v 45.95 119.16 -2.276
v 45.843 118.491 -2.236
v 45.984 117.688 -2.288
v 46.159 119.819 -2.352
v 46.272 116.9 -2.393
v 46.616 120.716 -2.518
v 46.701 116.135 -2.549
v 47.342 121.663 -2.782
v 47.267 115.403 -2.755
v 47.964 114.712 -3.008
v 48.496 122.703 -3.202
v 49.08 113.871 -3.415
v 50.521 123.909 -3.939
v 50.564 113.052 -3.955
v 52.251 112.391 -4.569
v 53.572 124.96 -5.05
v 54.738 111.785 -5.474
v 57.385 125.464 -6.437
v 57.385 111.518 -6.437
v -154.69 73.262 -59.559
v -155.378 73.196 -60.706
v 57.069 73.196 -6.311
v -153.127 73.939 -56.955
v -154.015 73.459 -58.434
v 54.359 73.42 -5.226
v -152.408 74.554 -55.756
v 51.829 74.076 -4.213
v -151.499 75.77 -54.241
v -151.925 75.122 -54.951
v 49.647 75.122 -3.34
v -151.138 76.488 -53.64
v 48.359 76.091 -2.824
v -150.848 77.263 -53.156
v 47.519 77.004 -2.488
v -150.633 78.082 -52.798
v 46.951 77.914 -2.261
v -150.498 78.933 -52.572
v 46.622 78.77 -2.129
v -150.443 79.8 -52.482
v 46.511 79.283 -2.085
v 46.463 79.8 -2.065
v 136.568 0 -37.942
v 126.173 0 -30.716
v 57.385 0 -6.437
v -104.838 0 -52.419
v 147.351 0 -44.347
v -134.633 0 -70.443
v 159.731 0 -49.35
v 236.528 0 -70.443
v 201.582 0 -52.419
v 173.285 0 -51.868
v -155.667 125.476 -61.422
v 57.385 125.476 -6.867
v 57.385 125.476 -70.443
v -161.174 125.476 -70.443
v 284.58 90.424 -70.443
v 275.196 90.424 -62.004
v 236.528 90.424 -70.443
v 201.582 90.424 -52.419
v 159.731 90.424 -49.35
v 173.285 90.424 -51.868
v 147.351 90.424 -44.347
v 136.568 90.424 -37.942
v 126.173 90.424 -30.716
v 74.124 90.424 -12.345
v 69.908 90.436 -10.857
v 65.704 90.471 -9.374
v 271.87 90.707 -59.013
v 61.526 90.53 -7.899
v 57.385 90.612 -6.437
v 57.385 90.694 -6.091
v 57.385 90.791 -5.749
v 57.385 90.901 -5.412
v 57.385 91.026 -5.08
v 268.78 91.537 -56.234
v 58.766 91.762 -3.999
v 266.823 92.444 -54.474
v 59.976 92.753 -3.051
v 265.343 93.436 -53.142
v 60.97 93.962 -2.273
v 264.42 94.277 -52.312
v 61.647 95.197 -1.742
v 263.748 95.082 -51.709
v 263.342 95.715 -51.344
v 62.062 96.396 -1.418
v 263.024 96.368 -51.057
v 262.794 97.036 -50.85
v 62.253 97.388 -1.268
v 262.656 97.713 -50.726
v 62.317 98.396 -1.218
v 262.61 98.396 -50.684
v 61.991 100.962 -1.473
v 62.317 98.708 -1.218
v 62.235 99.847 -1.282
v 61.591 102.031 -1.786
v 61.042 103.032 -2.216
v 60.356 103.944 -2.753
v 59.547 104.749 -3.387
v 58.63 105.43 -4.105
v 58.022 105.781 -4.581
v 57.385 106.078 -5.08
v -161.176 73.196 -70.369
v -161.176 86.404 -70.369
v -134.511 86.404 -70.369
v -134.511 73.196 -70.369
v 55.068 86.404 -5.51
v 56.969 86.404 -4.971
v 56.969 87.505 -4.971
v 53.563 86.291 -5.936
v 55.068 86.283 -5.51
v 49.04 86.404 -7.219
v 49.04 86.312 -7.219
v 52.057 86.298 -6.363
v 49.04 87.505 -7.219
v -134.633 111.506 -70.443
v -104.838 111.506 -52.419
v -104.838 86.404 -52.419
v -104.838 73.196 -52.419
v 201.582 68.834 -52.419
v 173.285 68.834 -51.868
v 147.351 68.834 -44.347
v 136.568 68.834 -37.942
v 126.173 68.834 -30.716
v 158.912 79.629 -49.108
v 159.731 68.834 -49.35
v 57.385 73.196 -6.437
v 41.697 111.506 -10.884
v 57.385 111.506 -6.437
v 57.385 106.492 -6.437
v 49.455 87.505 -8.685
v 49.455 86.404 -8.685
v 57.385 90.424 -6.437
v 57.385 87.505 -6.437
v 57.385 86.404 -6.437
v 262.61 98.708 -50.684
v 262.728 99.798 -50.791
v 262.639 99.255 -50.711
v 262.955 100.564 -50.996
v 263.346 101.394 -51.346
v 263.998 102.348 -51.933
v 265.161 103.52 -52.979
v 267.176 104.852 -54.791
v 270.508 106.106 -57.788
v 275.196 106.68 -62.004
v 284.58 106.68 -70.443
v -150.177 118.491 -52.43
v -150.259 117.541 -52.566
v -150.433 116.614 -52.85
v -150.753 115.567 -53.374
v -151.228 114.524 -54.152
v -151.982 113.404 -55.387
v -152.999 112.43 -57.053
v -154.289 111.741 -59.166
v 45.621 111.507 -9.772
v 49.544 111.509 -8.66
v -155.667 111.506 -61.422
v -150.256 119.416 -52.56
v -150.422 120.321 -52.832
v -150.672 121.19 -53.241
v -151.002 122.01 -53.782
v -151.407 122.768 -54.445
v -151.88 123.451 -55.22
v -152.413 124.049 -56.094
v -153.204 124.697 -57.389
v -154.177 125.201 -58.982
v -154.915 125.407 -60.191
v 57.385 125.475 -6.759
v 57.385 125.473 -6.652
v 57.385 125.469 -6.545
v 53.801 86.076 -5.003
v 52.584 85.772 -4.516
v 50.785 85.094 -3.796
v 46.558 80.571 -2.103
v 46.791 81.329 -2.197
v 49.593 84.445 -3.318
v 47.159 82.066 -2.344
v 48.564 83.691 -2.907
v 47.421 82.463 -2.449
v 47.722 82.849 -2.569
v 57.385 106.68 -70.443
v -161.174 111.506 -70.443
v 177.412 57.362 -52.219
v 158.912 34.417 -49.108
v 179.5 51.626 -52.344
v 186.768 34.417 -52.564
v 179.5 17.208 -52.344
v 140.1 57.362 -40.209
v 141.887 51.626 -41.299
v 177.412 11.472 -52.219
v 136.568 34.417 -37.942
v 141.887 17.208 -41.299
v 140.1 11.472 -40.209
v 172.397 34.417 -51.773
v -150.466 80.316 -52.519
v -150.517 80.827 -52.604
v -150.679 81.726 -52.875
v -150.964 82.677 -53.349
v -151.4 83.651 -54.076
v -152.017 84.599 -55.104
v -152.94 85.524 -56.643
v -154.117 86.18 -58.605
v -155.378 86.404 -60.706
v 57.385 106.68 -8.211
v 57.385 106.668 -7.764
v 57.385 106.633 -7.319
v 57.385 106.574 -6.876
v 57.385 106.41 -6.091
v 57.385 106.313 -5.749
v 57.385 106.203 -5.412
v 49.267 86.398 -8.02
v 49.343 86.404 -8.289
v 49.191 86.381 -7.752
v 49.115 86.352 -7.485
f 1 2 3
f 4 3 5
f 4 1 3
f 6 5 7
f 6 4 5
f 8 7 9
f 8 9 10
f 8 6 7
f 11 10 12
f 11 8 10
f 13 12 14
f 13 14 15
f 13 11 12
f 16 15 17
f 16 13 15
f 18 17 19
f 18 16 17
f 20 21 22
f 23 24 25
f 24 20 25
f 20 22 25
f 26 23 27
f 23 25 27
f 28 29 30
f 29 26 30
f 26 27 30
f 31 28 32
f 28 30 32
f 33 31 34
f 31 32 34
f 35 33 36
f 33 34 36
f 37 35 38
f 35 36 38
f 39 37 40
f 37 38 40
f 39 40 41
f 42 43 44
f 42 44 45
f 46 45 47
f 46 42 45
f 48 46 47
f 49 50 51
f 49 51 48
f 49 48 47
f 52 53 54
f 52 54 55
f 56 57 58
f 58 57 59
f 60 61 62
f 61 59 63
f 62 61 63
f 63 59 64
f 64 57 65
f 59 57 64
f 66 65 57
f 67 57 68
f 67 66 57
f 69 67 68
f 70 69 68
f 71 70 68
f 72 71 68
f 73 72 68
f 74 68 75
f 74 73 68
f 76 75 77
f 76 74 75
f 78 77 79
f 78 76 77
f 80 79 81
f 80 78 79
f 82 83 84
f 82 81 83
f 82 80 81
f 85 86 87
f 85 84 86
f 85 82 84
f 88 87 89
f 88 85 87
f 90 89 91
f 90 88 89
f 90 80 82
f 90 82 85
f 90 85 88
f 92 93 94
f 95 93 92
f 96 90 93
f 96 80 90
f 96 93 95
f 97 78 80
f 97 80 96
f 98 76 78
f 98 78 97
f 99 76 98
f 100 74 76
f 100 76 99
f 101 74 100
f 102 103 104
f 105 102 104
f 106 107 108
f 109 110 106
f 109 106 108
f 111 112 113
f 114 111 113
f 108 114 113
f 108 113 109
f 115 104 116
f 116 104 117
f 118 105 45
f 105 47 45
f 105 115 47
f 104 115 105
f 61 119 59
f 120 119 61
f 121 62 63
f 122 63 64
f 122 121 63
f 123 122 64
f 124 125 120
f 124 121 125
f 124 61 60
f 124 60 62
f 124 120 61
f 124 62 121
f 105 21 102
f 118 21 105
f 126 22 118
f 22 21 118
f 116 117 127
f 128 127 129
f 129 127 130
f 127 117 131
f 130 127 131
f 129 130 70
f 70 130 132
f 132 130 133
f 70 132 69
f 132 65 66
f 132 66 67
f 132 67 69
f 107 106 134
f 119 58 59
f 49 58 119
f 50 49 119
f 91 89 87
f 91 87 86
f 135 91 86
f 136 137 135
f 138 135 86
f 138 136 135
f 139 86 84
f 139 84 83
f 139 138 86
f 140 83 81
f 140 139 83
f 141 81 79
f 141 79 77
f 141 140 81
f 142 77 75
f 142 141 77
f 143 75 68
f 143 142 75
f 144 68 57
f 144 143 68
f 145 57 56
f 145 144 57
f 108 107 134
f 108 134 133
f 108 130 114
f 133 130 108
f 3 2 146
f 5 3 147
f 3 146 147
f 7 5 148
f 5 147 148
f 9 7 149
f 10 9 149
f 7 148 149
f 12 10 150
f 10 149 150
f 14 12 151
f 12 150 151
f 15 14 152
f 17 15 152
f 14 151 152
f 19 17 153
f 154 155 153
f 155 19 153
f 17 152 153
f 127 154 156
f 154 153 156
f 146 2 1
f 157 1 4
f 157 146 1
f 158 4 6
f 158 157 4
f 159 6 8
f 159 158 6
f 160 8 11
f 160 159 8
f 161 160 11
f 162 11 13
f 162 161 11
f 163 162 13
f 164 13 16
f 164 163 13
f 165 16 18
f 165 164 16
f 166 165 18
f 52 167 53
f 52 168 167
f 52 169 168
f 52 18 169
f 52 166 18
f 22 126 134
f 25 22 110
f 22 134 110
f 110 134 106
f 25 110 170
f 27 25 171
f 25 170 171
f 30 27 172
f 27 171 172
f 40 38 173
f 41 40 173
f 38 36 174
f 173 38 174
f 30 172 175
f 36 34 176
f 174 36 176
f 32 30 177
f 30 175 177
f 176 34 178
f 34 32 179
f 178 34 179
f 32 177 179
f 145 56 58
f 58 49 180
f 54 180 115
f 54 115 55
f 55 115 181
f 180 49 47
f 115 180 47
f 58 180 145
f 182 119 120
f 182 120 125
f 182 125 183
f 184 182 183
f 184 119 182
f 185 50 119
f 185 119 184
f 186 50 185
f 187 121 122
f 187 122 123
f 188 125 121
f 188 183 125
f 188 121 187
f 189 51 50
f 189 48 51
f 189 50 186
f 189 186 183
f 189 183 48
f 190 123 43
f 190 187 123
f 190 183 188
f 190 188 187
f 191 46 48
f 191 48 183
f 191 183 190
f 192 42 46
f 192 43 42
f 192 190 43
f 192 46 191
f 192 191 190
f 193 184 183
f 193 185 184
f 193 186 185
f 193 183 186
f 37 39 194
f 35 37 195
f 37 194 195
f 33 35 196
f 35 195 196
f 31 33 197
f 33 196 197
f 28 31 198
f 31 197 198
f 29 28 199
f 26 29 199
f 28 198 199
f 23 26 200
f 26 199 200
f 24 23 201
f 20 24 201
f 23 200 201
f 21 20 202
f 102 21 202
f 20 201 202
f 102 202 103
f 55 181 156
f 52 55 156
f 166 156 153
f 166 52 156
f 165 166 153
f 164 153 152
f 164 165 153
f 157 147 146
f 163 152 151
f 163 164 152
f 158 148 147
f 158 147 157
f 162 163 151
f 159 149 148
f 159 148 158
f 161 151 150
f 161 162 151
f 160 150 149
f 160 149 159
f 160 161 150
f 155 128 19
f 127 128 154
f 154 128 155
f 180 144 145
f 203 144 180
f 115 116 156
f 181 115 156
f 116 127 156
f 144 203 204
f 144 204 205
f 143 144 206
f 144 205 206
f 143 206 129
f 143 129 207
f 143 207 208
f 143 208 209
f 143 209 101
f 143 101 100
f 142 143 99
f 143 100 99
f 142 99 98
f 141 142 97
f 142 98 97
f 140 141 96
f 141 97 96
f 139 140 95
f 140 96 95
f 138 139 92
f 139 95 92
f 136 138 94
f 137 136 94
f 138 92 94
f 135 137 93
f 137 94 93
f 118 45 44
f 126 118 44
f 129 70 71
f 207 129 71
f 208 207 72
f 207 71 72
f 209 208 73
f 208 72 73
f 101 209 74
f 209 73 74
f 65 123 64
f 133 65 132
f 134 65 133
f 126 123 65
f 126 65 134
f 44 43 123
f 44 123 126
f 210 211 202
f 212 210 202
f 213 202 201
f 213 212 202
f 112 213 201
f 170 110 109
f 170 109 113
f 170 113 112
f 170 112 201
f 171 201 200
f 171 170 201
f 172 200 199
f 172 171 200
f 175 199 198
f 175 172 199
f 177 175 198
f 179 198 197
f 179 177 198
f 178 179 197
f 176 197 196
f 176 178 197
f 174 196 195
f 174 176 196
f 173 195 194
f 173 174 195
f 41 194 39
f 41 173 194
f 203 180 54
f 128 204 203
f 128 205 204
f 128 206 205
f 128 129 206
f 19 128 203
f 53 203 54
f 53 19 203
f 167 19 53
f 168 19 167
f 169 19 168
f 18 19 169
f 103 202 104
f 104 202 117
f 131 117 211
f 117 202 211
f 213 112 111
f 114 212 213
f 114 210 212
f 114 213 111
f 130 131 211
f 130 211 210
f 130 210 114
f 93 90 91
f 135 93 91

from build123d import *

# Parameters (mm, degrees)
F1_DEPTH      = 68.834
F3_DEPTH      = 56.642
F4_DEPTH      = 21.59
F6_DEPTH      = 16.256
F7_T1_DEPTH   = 134.6089194051
F8_SIZE       = 5.08
F9_T4_DEPTH   = 246.1695934192
F9_T9_DEPTH   = 246.1695934192
F11_DEPTH     = 13.97
F12_T1_DEPTH  = 239.1129526059
F12_T6_DEPTH  = 239.1129526059
F13_W         = 8.2417714845
F13_H         = 1.1003240943
F14_DEPTH     = 1.524
F16_DEPTH     = 13.208
F17_T1_DEPTH  = 236.9807138407
F17_T6_DEPTH  = 236.9807138407
F17_T12_DEPTH = 236.9807138407
F17_T18_DEPTH = 236.9807138407


# Not quite as in the source:
# - a fillet or chamfer that OpenCascade refuses, or shapes differently, is made with other operations: its cross-section is extruded or revolved along the edge and cut away or added


with BuildPart() as f1:
    # F0 (on Front) → F1 (new body)
    with BuildSketch(Plane.XZ):
        with BuildLine():
            Line((-134.6334815025, -70.4434812069), (236.5282326937, -70.4434812069))
            Line((236.5282326937, -70.4434812069), (201.5823870897, -52.4187758565))
            add(Edge.make_bspline(
                [(201.5823870897, -52.4187758565), (186.6945113423, -52.7201094998), (157.86128429, -53.3036998994), (136.5029788289, -38.0790520799), (126.1729151011, -30.7155661285)],
                knots=[0, 0, 0, 0, 0.5163444147, 1, 1, 1, 1], degree=3))
            Line((126.1729151011, -30.7155661285), (57.3847740889, -6.4373956993))
            Line((57.3847740889, -6.4373956993), (-104.8375442624, -52.4187758565))
            Line((-104.8375442624, -52.4187758565), (-134.6334815025, -70.4434812069))
        make_face()
    extrude(amount=-F1_DEPTH)

    # F2 (on face) → F3 (join)
    with BuildSketch(Plane(origin=(0, 68.834, 0), x_dir=(-1, 0, 0), z_dir=(0, 1, 0))):
        Polygon((104.8375442624, -52.4187758565), (-57.3847740889, -6.4373956993), (-57.3847740889, -70.4434812069), (134.6334815025, -70.4434812069), align=None)
    extrude(amount=F3_DEPTH)

    # F4 (add): a face of the model
    f4_faces = [f1.faces().sort_by_distance(p)[0] for p in [
        (117.597457412, 68.834, -49.4942566091),
    ]]
    extrude(f4_faces, amount=F4_DEPTH)

    # F5 (on face) → F6 (join)
    with BuildSketch(Plane(origin=(0, 90.424, 0), x_dir=(-1, 0, 0), z_dir=(0, 1, 0))):
        Polygon((-284.8027348518, -56.1655424535), (-284.8027348518, -70.4434812069), (-57.3847740889, -70.4434812069), (-57.3847740889, 0), align=None)
    extrude(amount=F6_DEPTH)

    # F7: chamfer of 22.86 x 14.478 on 1 edges, made by hand

    # F7_s2 → F7_t1 (cut)
    with BuildSketch(Plane.XZ.offset(-165.8564597025)):
        Polygon((262.6095480908, -50.6844785612), (284.8027348518, -70.6435424535), (284.8027348518, -56.1655424535), align=None)
    extrude(amount=F7_T1_DEPTH, mode=Mode.SUBTRACT)

    # F8
    f8_edges = [f1.edges().sort_by_distance(p)[0] for p in [
        (57.384774, 98.552, 0),
    ]]
    chamfer(f8_edges, length=F8_SIZE)

    # F9: fillet of radius 7.971733183 on 2 edges, made by hand


with BuildPart() as f9_tool2:
    # F9_s3 → F9_t4 (new body)
    with BuildSketch(Plane(origin=(39.6696512747, 0, -9.7972362223), x_dir=(0, 1, 0), z_dir=(0.970830567, 0, -0.2397665745))):
        with BuildLine():
            ThreePointArc((106.68, 5.7872175269), (104.3451334085, 11.4240841184), (98.708266817, 13.7589507099))
            Line((98.708266817, 13.7589507099), (106.68, 13.7589507099))
            Line((106.68, 13.7589507099), (106.68, 5.7872175269))
        make_face()
    extrude(amount=F9_T4_DEPTH)

    split(bisect_by=Plane.YZ.offset(57.3847740889), keep=Keep.TOP)


with BuildPart() as f1_1:
    add(f1.part)

    # F9_t1: cut F9_tool2
    add(f9_tool2.part, mode=Mode.SUBTRACT)


with BuildPart() as f9_tool7:
    # F9_s8 → F9_t9 (new body)
    with BuildSketch(Plane(origin=(39.6696512747, 0, -9.7972362223), x_dir=(0, 1, 0), z_dir=(0.970830567, 0, -0.2397665745))):
        with BuildLine():
            ThreePointArc((90.424, 5.7872175269), (92.7588665915, 11.4240841184), (98.395733183, 13.7589507099))
            Line((98.395733183, 13.7589507099), (90.424, 13.7589507099))
            Line((90.424, 13.7589507099), (90.424, 5.7872175269))
        make_face()
    extrude(amount=F9_T9_DEPTH)

    split(bisect_by=Plane(origin=(4.3361166105, 0, 12.285662205), x_dir=(0, 1, 0), z_dir=(0.3328201545, 0, 0.9429903206)), keep=Keep.TOP)


with BuildPart() as f1_2:
    add(f1_1.part)

    # F9_t6: cut F9_tool7
    add(f9_tool7.part, mode=Mode.SUBTRACT)

    # F10 (on face) → F11 (join)
    with BuildSketch(Plane(origin=(0, 125.476, 0), x_dir=(-1, 0, 0), z_dir=(0, 1, 0))):
        Polygon((-45.8267219365, -2.2306151222), (-57.3847740889, -6.4373956993), (104.8375442624, -52.4187758565), (134.6334815025, -70.4434812069), (161.1742377281, -70.4434812069), (150.1698791981, -52.4187758565), align=None)
    extrude(amount=-F11_DEPTH)

    # F12: fillet of radius 7.3585229381 on 2 edges, made by hand

    # F12_s2 → F12_t1 (cut)
    with BuildSketch(Plane(origin=(-171.3471837913, 0, -43.8762710766), x_dir=(0, 1, 0), z_dir=(0.9687439392, 0, 0.2480628554))):
        with BuildLine():
            ThreePointArc((118.1174770619, -13.5288023788), (123.3207385309, -15.6840638479), (125.476, -20.8873253169))
            Line((125.476, -20.8873253169), (125.476, -13.5288023788))
            Line((125.476, -13.5288023788), (118.1174770619, -13.5288023788))
        make_face()
    extrude(amount=F12_T1_DEPTH, mode=Mode.SUBTRACT)


with BuildPart() as f12_tool4:
    # F12_s5 → F12_t6 (new body)
    with BuildSketch(Plane(origin=(-171.3471837913, 0, -43.8762710766), x_dir=(0, 1, 0), z_dir=(0.9687439392, 0, 0.2480628554))):
        with BuildLine():
            ThreePointArc((118.8645229381, -13.5288023788), (113.6612614691, -15.6840638479), (111.506, -20.8873253169))
            Line((111.506, -20.8873253169), (111.506, -13.5288023788))
            Line((111.506, -13.5288023788), (118.8645229381, -13.5288023788))
        make_face()
    extrude(amount=F12_T6_DEPTH)

    split(bisect_by=Plane(origin=(5.9565096776, 0, -21.0145673287), x_dir=(0, 1, 0), z_dir=(-0.272703532, 0, 0.9620981154)), keep=Keep.TOP)


with BuildPart() as f1_3:
    add(f1_2.part)

    # F12_t3: cut F12_tool4
    add(f12_tool4.part, mode=Mode.SUBTRACT)

    # F13 (on face) → F14 (join)
    with BuildSketch(Plane(origin=(5.9565096776, 0, -21.0145673287), x_dir=(0.9620981154, 0, 0.272703532), z_dir=(-0.272703532, 0, 0.9620981154))):
        with Locations((49.3333967155, 86.9543515146)):
            Rectangle(F13_W, F13_H)
    extrude(amount=F14_DEPTH)

    # F15 (on face) → F16 (join)
    with BuildSketch(Plane.XZ.offset(-86.4041894674)):
        Polygon((-104.8238277435, -52.4797327816), (57.3847740889, -6.4373956993), (46.4603118598, -2.0644166507), (-150.4420638084, -52.4797327816), (-161.1757725477, -70.3692361712), (-134.1178864241, -70.3692361712), align=None)
    extrude(amount=F16_DEPTH)

    # F17: fillet of radius 6.7453126933 on 2 edges, made by hand

    # F17_s2 → F17_t1 (cut)
    with BuildSketch(Plane(origin=(59.4421171299, 0, 15.219690044), x_dir=(0, 1, 0), z_dir=(-0.9687495941, 0, -0.2480407708))):
        with BuildLine():
            ThreePointArc((73.1961894674, 20.2692670518), (75.1718458141, 15.4996107052), (79.9415021607, 13.5239543585))
            Line((79.9415021607, 13.5239543585), (73.1961894674, 13.5239543585))
            Line((73.1961894674, 13.5239543585), (73.1961894674, 20.2692670518))
        make_face()
    extrude(amount=F17_T1_DEPTH, mode=Mode.SUBTRACT)


with BuildPart() as f17_tool4:
    # F17_s5 → F17_t6 (new body)
    with BuildSketch(Plane(origin=(59.4421171299, 0, 15.219690044), x_dir=(0, 1, 0), z_dir=(-0.9687495941, 0, -0.2480407708))):
        with BuildLine():
            ThreePointArc((86.4041894674, 20.2692670518), (84.4285331208, 15.4996107052), (79.6588767742, 13.5239543585))
            Line((79.6588767742, 13.5239543585), (86.4041894674, 13.5239543585))
            Line((86.4041894674, 13.5239543585), (86.4041894674, 20.2692670518))
        make_face()
    extrude(amount=F17_T6_DEPTH)

    split(bisect_by=Plane(origin=(43.4988715987, 0, 12.3296114352), x_dir=(0, 1, 0), z_dir=(0.9620981154, 0, 0.272703532)), keep=Keep.TOP)

    split(bisect_by=Plane(origin=(5.5409094947, 0, -19.5483298008), x_dir=(0, 1, 0), z_dir=(-0.272703532, 0, 0.9620981154)), keep=Keep.TOP)


with BuildPart() as f1_4:
    add(f1_3.part)

    # F17_t3: cut F17_tool4
    add(f17_tool4.part, mode=Mode.SUBTRACT)


with BuildPart() as f17_tool10:
    # F17_s11 → F17_t12 (new body)
    with BuildSketch(Plane(origin=(59.4421171299, 0, 15.219690044), x_dir=(0, 1, 0), z_dir=(-0.9687495941, 0, -0.2480407708))):
        with BuildLine():
            ThreePointArc((86.4041894674, 20.2692670518), (84.4285331208, 15.4996107052), (79.6588767742, 13.5239543585))
            Line((79.6588767742, 13.5239543585), (86.4041894674, 13.5239543585))
            Line((86.4041894674, 13.5239543585), (86.4041894674, 20.2692670518))
        make_face()
    extrude(amount=F17_T12_DEPTH)

    split(bisect_by=Plane(origin=(43.4988715987, 0, 12.3296114352), x_dir=(0, 1, 0), z_dir=(-0.9620981154, 0, -0.272703532)), keep=Keep.TOP)

    split(bisect_by=Plane(origin=(5.5409094947, 0, -19.5483298008), x_dir=(0, 1, 0), z_dir=(0.272703532, 0, -0.9620981154)), keep=Keep.TOP)


with BuildPart() as f1_5:
    add(f1_4.part)

    # F17_t9: cut F17_tool10
    add(f17_tool10.part, mode=Mode.SUBTRACT)


with BuildPart() as f17_tool16:
    # F17_s17 → F17_t18 (new body)
    with BuildSketch(Plane(origin=(59.4421171299, 0, 15.219690044), x_dir=(0, 1, 0), z_dir=(-0.9687495941, 0, -0.2480407708))):
        with BuildLine():
            ThreePointArc((86.4041894674, 20.2692670518), (84.4285331208, 15.4996107052), (79.6588767742, 13.5239543585))
            Line((79.6588767742, 13.5239543585), (86.4041894674, 13.5239543585))
            Line((86.4041894674, 13.5239543585), (86.4041894674, 20.2692670518))
        make_face()
    extrude(amount=F17_T18_DEPTH)

    split(bisect_by=Plane(origin=(43.4988715987, 0, 12.3296114352), x_dir=(0, 1, 0), z_dir=(-0.9620981154, 0, -0.272703532)), keep=Keep.TOP)

    split(bisect_by=Plane(origin=(5.5409094947, 0, -19.5483298008), x_dir=(0, 1, 0), z_dir=(-0.272703532, 0, 0.9620981154)), keep=Keep.TOP)


with BuildPart() as f1_6:
    add(f1_5.part)

    # F17_t15: cut F17_tool16
    add(f17_tool16.part, mode=Mode.SUBTRACT)


solid = f1_6.part
